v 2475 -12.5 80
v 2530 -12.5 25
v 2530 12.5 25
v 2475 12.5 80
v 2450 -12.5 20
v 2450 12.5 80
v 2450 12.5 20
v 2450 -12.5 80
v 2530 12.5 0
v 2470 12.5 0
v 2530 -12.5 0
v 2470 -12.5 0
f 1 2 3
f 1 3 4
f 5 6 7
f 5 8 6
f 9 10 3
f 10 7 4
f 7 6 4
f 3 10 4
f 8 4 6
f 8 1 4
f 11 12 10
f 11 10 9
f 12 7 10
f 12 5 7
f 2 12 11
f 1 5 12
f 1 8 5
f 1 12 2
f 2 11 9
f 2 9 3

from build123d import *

# Parameters (mm, degrees)
F1_DEPTH = 12.5


with BuildPart() as f1:
    # F0 (on Front) → F1 (new body, symmetric)
    with BuildSketch(Plane.XZ):
        Polygon((2450, 20), (2470, 0), (2530, 0), (2530, 25), (2475, 80), (2450, 80), align=None)
    extrude(amount=F1_DEPTH, both=True)


with BuildPart() as f2_1:
    # F2: copy of F1
    add(f1.part)


solid = f1.part
